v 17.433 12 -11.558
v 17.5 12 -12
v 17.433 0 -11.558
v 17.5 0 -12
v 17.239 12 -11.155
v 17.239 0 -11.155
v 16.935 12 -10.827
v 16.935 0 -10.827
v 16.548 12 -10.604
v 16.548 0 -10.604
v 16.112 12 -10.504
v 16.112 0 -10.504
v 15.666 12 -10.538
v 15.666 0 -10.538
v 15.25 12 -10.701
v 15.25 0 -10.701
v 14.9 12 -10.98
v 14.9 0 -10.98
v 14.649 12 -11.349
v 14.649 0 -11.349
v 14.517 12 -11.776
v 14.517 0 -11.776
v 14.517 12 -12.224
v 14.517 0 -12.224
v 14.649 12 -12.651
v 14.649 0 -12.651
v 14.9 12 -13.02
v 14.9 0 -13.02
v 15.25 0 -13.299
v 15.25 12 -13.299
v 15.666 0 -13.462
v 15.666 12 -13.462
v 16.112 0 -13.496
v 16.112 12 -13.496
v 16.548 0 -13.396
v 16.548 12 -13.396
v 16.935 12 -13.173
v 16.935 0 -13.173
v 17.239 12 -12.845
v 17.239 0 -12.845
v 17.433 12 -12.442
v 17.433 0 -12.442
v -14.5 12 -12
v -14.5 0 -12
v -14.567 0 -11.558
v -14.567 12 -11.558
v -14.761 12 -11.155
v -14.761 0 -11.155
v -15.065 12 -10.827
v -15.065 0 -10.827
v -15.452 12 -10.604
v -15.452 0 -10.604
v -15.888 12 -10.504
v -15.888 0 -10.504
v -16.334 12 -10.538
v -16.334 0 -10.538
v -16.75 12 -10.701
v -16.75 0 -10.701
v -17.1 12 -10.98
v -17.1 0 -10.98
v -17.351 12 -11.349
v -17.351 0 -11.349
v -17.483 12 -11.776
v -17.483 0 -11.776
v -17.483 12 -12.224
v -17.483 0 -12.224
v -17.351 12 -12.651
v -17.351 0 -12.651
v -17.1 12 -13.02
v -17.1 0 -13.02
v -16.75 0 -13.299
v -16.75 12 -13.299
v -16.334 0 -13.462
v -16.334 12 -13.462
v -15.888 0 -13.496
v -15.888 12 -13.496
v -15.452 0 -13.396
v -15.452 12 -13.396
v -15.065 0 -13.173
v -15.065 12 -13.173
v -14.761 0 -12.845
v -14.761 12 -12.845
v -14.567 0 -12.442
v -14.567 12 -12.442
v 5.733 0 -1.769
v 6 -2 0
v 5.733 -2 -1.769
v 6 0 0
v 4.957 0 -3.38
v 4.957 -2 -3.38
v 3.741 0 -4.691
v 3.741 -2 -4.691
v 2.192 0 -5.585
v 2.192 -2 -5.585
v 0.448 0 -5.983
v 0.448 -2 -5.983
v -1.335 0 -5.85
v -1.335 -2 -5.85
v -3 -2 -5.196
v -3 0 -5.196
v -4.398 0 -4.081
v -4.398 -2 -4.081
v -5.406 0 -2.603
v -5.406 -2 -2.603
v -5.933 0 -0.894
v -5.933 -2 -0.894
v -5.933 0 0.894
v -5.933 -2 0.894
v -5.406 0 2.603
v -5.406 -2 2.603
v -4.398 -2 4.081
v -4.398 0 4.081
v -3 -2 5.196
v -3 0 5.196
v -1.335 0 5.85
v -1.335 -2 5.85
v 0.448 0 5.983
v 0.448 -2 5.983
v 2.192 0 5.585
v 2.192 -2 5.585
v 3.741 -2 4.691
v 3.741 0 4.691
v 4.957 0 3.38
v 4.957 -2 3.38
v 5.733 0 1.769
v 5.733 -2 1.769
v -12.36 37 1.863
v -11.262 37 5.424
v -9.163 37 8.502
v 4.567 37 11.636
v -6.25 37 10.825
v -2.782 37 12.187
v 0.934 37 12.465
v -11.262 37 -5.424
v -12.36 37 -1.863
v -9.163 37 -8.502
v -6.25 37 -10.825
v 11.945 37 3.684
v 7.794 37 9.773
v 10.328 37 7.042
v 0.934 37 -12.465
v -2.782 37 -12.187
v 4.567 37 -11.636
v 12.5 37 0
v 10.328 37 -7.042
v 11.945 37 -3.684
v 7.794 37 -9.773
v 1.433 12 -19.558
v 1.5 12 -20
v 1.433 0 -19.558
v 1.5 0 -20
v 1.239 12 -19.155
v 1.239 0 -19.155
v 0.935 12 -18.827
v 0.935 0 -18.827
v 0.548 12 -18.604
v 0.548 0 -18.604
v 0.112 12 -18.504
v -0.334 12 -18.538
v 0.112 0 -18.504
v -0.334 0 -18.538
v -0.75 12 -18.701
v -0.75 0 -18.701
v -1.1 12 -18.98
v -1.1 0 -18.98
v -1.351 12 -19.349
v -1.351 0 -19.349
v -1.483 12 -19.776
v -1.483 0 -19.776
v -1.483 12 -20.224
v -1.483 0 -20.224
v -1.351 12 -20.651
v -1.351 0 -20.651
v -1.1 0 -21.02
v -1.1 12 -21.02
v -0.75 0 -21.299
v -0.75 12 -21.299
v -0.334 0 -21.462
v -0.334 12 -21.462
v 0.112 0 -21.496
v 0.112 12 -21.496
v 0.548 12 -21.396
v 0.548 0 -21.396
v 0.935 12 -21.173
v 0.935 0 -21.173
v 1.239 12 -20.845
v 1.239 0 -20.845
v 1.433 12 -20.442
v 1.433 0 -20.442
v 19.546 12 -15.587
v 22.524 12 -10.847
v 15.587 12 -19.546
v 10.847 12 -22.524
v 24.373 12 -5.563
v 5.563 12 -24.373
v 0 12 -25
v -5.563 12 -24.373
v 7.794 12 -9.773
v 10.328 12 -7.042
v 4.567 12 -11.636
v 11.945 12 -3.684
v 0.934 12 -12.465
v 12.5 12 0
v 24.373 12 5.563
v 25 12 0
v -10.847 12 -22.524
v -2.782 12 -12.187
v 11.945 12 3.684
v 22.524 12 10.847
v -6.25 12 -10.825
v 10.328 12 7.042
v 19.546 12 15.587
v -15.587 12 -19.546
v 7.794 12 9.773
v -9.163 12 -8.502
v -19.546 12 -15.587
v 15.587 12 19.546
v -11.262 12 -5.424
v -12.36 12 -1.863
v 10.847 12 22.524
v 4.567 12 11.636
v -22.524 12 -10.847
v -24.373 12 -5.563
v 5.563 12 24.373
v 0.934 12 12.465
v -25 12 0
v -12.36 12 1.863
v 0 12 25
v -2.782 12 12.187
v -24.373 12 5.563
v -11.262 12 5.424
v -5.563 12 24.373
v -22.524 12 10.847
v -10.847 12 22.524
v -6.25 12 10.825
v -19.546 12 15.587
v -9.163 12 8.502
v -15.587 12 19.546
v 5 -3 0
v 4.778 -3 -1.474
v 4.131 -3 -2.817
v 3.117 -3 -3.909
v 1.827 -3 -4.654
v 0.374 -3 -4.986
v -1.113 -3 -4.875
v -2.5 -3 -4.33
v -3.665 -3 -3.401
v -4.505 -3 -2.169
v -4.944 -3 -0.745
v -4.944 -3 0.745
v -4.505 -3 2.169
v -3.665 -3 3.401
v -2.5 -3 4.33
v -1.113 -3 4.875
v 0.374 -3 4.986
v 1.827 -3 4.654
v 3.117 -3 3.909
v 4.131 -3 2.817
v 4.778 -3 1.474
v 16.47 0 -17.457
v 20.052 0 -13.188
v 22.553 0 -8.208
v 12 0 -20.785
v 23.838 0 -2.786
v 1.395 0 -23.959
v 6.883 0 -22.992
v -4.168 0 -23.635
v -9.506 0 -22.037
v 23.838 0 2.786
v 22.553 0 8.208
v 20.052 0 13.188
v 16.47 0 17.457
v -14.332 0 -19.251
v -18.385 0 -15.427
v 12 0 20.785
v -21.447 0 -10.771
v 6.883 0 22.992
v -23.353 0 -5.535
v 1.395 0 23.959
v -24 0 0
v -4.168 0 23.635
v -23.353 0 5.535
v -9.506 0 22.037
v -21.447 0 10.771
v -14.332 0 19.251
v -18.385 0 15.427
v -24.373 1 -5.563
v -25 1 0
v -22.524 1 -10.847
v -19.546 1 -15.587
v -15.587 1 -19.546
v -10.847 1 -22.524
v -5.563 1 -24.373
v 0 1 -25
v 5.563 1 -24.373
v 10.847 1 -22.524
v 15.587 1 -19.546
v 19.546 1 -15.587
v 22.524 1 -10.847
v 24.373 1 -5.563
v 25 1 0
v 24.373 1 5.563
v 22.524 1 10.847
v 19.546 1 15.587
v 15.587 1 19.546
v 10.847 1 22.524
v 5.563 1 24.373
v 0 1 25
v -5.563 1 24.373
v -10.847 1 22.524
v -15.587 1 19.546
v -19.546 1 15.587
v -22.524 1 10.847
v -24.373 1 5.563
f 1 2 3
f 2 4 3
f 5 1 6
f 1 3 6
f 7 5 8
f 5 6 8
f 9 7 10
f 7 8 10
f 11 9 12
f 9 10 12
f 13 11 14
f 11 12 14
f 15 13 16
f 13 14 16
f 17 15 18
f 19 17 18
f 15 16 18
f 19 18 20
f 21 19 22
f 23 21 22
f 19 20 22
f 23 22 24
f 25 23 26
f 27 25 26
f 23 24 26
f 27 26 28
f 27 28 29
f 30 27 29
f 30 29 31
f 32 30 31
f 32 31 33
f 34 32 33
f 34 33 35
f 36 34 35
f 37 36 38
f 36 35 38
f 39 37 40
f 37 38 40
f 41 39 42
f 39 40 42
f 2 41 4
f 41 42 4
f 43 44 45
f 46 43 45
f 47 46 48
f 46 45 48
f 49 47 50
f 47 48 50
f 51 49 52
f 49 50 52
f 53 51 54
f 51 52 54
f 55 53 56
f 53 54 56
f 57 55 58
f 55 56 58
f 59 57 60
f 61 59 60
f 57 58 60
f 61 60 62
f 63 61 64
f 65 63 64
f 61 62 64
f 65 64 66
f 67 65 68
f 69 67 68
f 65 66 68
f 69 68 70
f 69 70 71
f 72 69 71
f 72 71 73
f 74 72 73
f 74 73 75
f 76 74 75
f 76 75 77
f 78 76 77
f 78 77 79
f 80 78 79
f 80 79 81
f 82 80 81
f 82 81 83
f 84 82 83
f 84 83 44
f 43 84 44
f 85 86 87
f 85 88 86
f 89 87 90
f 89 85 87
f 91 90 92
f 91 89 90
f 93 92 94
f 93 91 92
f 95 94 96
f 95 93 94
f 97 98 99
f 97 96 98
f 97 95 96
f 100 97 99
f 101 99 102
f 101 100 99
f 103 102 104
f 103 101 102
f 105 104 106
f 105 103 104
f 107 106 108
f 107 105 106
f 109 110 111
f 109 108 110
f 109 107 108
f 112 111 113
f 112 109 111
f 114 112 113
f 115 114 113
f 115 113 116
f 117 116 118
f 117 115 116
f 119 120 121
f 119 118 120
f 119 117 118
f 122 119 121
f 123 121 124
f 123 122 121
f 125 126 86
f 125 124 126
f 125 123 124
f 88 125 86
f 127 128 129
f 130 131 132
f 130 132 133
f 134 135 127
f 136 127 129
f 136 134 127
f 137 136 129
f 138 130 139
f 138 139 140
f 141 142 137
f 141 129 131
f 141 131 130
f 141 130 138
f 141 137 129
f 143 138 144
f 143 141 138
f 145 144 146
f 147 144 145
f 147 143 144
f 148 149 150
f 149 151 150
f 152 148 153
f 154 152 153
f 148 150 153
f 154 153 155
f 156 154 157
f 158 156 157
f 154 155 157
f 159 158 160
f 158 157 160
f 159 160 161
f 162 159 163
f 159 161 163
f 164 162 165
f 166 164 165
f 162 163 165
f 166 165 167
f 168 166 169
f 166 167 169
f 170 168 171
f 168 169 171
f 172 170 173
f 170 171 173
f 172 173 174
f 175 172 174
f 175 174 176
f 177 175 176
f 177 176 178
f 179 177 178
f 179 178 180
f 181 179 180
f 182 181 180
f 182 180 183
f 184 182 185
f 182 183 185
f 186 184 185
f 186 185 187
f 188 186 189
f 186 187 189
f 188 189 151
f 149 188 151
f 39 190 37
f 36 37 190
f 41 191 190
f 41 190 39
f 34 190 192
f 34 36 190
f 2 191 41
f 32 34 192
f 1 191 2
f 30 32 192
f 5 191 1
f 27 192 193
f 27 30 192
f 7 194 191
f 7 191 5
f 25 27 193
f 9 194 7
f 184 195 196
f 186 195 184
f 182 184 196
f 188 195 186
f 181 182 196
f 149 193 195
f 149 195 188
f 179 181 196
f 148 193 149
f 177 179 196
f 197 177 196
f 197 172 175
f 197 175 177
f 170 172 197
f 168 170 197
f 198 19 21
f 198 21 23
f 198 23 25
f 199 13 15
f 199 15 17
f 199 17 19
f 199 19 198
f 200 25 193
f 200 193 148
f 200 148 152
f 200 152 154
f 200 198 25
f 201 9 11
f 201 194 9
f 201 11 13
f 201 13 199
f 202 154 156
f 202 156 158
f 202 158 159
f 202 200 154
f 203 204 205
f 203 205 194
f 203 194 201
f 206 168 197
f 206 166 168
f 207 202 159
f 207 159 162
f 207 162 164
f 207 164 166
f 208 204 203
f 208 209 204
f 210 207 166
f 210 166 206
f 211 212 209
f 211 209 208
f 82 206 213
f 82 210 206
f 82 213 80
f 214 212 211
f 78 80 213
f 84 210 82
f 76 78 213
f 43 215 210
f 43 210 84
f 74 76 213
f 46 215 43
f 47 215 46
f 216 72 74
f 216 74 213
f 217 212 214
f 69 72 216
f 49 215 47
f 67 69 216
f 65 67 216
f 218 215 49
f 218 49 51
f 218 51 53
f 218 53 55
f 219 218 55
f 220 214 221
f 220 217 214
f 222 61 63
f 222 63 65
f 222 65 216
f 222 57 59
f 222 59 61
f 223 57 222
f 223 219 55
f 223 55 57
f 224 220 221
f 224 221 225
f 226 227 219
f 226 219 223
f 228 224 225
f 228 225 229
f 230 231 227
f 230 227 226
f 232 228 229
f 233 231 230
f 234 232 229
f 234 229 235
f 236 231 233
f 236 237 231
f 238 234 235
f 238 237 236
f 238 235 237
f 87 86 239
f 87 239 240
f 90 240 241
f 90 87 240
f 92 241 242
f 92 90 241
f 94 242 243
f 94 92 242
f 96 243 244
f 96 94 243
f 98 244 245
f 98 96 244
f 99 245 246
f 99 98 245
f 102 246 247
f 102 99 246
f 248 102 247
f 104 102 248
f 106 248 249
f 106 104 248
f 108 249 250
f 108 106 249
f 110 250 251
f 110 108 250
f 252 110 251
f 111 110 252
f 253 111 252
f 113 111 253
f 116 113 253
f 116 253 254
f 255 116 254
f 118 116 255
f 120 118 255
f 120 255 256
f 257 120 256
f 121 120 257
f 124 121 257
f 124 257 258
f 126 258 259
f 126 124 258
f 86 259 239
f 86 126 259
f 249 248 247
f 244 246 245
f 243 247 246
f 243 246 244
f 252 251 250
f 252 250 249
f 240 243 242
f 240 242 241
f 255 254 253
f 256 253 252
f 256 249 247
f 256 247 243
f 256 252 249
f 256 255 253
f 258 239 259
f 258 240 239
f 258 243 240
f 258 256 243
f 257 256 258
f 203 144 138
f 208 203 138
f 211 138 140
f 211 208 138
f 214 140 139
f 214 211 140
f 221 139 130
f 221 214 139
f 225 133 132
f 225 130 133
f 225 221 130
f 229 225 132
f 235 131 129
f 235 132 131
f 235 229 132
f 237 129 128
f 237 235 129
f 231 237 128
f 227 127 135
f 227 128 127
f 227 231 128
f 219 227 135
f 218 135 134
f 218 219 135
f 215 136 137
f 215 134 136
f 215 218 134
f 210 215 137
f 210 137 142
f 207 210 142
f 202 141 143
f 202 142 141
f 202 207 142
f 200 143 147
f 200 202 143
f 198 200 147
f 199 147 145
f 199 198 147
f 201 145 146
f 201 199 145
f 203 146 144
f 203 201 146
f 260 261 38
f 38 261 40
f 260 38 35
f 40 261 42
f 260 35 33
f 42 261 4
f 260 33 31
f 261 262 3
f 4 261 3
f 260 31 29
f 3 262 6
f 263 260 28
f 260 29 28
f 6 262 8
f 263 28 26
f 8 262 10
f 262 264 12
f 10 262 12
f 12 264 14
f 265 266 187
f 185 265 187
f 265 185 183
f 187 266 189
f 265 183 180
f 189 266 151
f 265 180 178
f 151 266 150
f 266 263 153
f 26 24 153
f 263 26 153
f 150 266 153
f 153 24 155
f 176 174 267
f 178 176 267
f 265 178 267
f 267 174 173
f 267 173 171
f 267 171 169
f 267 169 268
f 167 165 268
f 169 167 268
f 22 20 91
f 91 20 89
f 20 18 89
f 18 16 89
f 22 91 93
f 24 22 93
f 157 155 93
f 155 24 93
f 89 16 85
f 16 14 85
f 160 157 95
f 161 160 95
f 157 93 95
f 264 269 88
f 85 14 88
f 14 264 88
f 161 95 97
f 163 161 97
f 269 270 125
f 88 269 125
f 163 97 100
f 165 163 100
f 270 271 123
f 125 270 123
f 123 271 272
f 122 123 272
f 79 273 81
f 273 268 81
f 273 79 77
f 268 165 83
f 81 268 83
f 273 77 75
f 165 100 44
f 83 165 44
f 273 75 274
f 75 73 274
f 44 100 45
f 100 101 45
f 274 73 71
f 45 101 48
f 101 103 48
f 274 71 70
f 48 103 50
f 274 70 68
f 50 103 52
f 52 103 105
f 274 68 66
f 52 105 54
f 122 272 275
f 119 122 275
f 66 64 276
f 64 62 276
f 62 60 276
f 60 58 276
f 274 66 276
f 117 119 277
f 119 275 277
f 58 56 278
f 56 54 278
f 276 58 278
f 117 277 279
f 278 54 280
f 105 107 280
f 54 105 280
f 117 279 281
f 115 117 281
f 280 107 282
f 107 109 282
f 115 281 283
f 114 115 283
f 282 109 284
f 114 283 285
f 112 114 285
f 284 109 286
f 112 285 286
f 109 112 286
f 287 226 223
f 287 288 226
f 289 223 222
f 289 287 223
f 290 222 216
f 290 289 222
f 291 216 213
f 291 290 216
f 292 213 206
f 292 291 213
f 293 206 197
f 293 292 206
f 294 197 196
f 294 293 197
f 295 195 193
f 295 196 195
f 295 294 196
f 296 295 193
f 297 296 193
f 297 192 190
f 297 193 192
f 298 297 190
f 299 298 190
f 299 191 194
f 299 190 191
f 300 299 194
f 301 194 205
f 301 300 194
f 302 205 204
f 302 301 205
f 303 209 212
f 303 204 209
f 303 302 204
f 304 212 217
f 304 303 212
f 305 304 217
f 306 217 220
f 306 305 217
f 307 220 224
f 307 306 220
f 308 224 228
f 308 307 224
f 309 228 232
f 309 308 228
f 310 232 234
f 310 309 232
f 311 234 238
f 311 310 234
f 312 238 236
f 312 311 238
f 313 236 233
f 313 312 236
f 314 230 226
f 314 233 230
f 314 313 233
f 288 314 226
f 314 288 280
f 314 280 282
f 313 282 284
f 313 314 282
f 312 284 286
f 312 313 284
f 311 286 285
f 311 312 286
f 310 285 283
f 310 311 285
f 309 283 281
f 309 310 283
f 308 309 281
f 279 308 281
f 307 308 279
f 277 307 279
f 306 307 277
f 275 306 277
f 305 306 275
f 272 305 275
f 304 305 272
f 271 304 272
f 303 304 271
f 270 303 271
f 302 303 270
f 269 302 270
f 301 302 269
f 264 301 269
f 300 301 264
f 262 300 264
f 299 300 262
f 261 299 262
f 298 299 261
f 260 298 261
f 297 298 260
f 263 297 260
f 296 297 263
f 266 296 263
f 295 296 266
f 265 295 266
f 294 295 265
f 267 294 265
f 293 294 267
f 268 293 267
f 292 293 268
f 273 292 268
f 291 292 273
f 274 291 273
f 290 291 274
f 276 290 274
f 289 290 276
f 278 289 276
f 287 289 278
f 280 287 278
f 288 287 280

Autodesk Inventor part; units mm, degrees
ref_plane "YZ Plane" through (0, 0, 0) normal (1, 0, 0) x (0, 1, 0)
ref_plane "XZ Plane" through (0, 0, 0) normal (0, 1, 0) x (-1, 0, 0)
ref_plane "XY Plane" through (0, 0, 0) normal (0, 0, 1) x (1, 0, 0)
sketch "Szkic1" plane through (0, 0, 0) normal (0, 1, 0) x (-1, 0, 0)
  circle A0 centre (0, 0) radius 25
  dimension "d0" = 50
extrude "Wyciągnięcie proste1" add sketch "Szkic1" along normal blind 12
sketch "Szkic2" plane through (0, 0, 0) normal (0, -1, 0) x (1, 0, 0)
  circle A0 centre (0, 0) radius 6
  dimension "d3" = 12
extrude "Wyciągnięcie proste2" add sketch "Szkic2" along normal blind 3
sketch "Szkic3" plane through (0, 12, 0) normal (0, 1, 0) x (1, 0, 0)
  circle A0 centre (0, 0) radius 12.5
  dimension "d6" = 25
extrude "Wyciągnięcie proste3" add sketch "Szkic3" along normal blind 25
chamfer "Faza1" distance 1 angle 45 1 edges at (-6, -3, 0)
chamfer "Faza2" distance 1 angle 45 1 edges at (25, 0, 0)
sketch "Szkic6" plane through (0, 0, 0) normal (0, -1, 0) x (1, 0, 0)
  circle A0 centre (0, 0) radius 20
  circle A1 centre (-16, -12) radius 1.5
  dimension "d16" = 40
  dimension "d17" = 3
extrude "Wyciągnięcie proste4" cut sketch "Szkic6" against normal blind 25 contours A1 A0 | A0 A1 picked at (-15.6226, -11.6657) picked at (-16.3566, -12.3446)
sketch "Szkic7" plane through (0, 0, 0) normal (0, -1, 0) x (1, 0, 0)
  circle A0 centre (0, 0) radius 5 projected
  circle A1 centre (0, 0) radius 20
  circle A2 centre (16, -12) radius 1.5
  dimension "d20" = 40
  dimension "d21" = 3
extrude "Wyciągnięcie proste5" cut sketch "Szkic7" against normal blind 25 contours A2 A1 | A1 A2 picked at (15.5641, -11.7467) picked at (16.3868, -12.3102)
sketch "Szkic9" plane through (0, 0, 0) normal (0, -1, 0) x (1, 0, 0)
  circle A0 centre (0, -20) radius 1.5
  point P0 (0, 0)
  dimension "d25" = 3
extrude "Wyciągnięcie proste6" cut sketch "Szkic9" against normal blind 25
